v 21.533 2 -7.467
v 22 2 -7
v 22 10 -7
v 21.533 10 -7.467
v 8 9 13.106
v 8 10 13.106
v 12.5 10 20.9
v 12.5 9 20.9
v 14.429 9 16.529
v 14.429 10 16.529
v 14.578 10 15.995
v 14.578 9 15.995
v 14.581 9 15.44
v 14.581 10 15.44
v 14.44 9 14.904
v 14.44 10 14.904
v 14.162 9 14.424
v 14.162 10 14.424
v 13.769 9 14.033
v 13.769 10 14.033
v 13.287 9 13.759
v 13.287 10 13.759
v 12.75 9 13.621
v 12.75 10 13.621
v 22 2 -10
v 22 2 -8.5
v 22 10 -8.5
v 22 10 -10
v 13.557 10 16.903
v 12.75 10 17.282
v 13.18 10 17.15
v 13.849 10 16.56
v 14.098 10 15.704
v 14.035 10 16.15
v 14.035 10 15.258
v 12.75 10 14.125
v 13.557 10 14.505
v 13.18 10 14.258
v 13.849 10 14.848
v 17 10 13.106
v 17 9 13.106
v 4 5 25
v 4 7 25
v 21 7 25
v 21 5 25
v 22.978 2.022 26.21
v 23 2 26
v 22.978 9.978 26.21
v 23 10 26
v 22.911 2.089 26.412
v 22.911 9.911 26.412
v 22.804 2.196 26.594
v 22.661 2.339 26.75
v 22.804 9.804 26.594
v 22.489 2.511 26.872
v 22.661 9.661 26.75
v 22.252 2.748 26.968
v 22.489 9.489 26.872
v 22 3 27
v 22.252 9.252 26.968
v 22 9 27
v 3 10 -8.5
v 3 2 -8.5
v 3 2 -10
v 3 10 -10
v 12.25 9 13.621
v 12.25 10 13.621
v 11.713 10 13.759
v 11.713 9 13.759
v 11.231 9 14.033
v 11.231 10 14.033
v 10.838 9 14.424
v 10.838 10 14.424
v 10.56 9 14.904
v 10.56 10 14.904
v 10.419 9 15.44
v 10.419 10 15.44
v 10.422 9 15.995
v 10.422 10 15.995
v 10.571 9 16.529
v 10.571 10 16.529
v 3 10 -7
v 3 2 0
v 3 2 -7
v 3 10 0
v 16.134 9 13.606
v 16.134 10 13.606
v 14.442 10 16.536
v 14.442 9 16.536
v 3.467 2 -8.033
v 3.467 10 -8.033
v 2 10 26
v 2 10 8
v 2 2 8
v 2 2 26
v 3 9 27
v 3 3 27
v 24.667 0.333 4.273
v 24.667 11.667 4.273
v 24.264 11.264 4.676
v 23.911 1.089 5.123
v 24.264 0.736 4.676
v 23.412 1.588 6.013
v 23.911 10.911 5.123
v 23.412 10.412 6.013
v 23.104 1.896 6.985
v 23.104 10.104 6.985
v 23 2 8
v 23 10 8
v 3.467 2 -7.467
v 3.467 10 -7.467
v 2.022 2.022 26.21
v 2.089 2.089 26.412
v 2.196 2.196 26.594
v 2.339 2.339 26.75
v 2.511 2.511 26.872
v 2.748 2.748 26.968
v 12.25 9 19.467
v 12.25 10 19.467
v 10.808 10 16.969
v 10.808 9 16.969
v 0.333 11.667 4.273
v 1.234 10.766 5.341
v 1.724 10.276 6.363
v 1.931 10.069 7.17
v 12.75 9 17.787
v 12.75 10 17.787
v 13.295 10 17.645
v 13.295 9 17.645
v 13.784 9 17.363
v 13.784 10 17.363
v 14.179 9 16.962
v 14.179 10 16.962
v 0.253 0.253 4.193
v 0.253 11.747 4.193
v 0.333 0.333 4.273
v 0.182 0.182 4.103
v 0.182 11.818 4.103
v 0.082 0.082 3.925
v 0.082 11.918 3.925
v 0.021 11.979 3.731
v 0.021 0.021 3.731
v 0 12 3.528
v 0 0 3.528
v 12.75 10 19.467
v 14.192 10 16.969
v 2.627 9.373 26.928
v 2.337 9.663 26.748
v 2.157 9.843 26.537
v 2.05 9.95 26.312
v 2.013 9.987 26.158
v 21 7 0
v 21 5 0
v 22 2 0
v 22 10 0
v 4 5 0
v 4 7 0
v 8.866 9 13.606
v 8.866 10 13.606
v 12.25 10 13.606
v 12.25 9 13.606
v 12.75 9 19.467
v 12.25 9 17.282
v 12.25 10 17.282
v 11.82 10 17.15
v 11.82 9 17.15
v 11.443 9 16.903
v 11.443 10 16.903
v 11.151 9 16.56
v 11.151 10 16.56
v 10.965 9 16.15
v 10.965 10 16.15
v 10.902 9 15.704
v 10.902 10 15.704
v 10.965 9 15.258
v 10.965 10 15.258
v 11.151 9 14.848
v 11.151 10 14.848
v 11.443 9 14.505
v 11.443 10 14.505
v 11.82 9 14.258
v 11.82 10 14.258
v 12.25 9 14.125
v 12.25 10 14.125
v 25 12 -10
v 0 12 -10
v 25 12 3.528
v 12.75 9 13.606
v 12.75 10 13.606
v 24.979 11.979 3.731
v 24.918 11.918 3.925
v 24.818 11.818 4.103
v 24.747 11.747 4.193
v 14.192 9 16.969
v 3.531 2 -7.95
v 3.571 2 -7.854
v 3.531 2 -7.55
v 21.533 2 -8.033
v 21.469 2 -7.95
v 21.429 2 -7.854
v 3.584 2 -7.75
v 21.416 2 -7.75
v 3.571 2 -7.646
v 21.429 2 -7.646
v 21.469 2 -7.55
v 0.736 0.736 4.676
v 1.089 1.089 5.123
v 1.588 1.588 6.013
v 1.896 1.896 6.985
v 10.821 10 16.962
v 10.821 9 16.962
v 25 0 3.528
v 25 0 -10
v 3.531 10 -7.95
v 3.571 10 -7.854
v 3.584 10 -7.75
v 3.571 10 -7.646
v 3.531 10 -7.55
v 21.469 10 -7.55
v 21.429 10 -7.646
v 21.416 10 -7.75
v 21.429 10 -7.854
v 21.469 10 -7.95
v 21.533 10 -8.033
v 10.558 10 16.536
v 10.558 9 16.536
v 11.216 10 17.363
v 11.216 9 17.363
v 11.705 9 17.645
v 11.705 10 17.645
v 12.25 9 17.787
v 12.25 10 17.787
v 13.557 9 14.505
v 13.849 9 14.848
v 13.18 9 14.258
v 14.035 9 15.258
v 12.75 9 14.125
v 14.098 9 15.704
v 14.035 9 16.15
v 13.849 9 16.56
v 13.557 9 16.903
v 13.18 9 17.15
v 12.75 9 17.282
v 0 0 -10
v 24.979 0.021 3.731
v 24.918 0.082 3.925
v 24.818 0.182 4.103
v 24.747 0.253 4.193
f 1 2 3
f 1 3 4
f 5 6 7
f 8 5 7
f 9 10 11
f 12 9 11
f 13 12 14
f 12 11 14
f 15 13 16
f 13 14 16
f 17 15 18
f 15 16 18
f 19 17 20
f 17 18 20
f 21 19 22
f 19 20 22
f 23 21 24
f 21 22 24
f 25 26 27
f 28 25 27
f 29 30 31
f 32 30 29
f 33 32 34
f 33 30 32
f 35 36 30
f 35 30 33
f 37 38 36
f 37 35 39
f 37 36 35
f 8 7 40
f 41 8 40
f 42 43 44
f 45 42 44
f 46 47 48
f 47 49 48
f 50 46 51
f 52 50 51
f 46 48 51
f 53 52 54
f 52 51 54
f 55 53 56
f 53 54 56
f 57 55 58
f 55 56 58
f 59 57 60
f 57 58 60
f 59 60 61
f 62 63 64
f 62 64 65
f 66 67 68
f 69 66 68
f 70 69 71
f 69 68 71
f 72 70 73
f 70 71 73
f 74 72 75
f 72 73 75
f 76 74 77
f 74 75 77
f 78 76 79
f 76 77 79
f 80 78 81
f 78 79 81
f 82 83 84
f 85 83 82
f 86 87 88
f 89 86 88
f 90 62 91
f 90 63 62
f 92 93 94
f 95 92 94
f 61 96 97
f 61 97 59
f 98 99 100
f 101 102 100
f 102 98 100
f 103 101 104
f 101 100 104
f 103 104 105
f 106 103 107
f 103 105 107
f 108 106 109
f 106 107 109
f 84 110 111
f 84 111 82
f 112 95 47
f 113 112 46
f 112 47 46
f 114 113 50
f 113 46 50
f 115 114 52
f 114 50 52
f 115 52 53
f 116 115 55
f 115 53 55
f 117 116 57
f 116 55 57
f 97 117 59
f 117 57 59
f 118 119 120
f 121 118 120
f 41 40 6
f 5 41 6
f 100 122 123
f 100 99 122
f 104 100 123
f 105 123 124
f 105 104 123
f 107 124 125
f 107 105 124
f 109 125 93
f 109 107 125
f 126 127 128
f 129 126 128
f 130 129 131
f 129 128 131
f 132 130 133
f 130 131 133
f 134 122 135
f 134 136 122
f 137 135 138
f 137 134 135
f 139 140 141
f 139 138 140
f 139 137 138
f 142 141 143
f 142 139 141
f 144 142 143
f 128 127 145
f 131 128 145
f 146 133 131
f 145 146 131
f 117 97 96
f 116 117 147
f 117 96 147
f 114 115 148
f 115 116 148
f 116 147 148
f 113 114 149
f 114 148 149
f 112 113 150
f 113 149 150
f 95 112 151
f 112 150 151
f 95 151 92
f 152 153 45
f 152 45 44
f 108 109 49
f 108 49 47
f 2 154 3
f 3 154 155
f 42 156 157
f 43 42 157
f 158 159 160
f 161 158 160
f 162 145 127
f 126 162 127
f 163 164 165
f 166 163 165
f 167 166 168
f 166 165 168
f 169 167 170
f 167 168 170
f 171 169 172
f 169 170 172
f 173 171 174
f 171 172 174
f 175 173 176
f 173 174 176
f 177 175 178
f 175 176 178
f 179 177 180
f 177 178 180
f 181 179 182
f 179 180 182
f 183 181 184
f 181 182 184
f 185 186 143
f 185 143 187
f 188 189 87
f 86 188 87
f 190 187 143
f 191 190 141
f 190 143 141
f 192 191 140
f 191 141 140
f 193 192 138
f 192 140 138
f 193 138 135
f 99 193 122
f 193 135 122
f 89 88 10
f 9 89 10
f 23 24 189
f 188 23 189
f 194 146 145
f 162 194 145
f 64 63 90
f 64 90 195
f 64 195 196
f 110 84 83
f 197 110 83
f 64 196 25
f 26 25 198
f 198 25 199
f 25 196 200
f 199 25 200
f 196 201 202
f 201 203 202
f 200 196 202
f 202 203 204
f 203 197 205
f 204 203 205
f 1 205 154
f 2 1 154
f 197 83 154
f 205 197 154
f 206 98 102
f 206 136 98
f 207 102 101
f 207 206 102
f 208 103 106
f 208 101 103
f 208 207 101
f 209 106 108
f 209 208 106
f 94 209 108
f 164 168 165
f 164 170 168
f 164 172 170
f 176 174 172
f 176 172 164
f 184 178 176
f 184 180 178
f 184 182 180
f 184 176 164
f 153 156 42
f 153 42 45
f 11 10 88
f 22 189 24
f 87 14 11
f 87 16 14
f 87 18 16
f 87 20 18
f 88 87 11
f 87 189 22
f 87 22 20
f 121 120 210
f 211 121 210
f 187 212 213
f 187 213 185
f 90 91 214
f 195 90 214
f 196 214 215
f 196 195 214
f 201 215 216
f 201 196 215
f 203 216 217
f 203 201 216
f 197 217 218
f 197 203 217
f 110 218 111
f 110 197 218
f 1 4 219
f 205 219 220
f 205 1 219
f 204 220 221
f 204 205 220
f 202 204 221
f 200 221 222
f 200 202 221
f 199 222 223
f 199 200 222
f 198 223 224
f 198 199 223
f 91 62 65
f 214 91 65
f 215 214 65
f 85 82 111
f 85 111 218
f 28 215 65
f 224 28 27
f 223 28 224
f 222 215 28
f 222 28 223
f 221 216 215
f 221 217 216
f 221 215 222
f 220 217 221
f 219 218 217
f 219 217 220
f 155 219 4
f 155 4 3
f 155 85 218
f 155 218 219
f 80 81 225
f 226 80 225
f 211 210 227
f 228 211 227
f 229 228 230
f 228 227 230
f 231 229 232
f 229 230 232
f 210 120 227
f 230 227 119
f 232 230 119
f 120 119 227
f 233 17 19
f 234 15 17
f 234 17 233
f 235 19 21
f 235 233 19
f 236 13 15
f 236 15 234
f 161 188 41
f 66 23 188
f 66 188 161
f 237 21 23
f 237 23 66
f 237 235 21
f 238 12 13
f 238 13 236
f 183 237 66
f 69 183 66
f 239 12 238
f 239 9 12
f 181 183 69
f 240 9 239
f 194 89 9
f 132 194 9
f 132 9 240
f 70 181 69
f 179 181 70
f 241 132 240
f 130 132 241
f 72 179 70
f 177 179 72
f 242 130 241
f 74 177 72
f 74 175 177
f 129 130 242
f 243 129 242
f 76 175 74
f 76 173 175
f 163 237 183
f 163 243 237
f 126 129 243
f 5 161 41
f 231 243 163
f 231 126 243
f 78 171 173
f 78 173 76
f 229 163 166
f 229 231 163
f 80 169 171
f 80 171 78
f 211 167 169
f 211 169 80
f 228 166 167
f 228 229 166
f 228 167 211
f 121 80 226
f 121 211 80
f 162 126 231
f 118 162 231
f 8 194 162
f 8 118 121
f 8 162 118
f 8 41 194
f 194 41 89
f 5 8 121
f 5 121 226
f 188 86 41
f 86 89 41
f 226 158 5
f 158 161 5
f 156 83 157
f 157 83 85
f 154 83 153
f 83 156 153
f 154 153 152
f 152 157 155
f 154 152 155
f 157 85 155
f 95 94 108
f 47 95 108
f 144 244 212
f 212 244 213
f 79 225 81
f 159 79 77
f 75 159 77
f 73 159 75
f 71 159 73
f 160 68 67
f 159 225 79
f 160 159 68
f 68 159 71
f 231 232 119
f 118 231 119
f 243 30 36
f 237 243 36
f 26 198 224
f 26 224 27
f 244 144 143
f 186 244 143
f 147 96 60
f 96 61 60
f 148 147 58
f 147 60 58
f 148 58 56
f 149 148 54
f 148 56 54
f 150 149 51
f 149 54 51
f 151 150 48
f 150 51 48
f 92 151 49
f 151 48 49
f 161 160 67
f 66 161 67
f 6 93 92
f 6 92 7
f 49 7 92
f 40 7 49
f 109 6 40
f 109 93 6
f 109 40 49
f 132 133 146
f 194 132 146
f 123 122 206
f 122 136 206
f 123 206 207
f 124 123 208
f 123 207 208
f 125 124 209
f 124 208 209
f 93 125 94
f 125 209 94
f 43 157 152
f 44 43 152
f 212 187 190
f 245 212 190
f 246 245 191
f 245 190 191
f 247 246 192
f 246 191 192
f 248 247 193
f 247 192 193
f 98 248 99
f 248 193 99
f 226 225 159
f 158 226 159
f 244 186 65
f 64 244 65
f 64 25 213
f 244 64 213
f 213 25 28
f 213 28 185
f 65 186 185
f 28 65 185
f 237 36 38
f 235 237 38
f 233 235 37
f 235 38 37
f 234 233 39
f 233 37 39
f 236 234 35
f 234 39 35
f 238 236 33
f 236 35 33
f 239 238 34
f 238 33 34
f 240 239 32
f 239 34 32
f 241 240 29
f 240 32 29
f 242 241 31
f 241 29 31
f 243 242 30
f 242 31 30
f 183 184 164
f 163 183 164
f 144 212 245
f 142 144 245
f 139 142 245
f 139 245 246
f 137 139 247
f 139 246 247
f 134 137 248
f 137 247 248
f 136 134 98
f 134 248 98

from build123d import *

# Parameters (mm, degrees)
F0_W           = 25
F0_H           = 12
F0_W_2         = 19
F0_H_2         = 8
F1_DEPTH       = 10
F2_W           = 21
F2_H           = 8
F2_W_2         = 17
F2_H_2         = 2
F3_DEPTH       = 25
F4_W           = 21
F4_H           = 8
F4_W_2         = 17
F4_H_2         = 2
F5_DEPTH       = 2
F6_W           = 25
F6_H           = 12
F7_DEPTH       = 4
F10_DEPTH      = 4
F10_DEPTH_BACK = 4
F11_T1_DEPTH   = 21
F11_T3_DEPTH   = 8
F11_T9_DEPTH   = 31
F11_T14_DEPTH  = 18
F11_T22_DEPTH  = 31
F11_T27_DEPTH  = 18
F11_T35_DEPTH  = 31
F11_T40_DEPTH  = 18
F11_T48_DEPTH  = 18
F11_T53_DEPTH  = 31
F12_R          = 1
F14_DEPTH      = 1


# Not quite as in the source:
# - a fillet or chamfer that OpenCascade refuses, or shapes differently, is made with other operations: its cross-section is extruded or revolved along the edge and cut away or added


with BuildPart() as f1:
    # F0 (on Top) → F1 (new body)
    with BuildSketch(Plane.XY):
        with Locations((12.5, 6)):
            Rectangle(F0_W, F0_H)
        with Locations((12.5, 6)):
            Rectangle(F0_W_2, F0_H_2, mode=Mode.SUBTRACT)
    extrude(amount=-F1_DEPTH)

    # F2 (on Top) → F3 (join)
    with BuildSketch(Plane.XY):
        with Locations((12.5, 6)):
            Rectangle(F2_W, F2_H)
        with Locations((12.5, 6)):
            Rectangle(F2_W_2, F2_H_2, mode=Mode.SUBTRACT)
    extrude(amount=F3_DEPTH)

    # F4 (on face) → F5 (join)
    with BuildSketch(Plane.XY.offset(25)):
        with Locations((12.5, 6)):
            Rectangle(F4_W, F4_H)
        with Locations((12.5, 6)):
            Rectangle(F4_W_2, F4_H_2, mode=Mode.SUBTRACT)
        with Locations((12.5, 6)):
            Rectangle(F4_W_2, F4_H_2)
    extrude(amount=F5_DEPTH)

    # F6 (on face) → F7 (join)
    with BuildSketch(Plane.XY):
        with Locations((12.5, 6)):
            Rectangle(F6_W, F6_H)
        Polygon((23, 2), (22, 2), (3, 2), (2, 2), (2, 10), (3, 10), (22, 10), (23, 10), align=None, mode=Mode.SUBTRACT)
    extrude(amount=F7_DEPTH)

    # F9 (on offset) → F10 (join, two sides)
    with BuildSketch(Plane.XZ.offset(-6)) as f10_sk:
        with BuildLine():
            Line((3, -7), (3, -8.5))
            Line((3, -8.5), (3.4671572875, -8.0328427125))
            ThreePointArc((3.4671572875, -8.0328427125), (3.5843145751, -7.75), (3.4671572875, -7.4671572875))
            Line((3.4671572875, -7.4671572875), (3, -7))
        make_face()
        with BuildLine():
            Line((21.5328427125, -8.0328427125), (22, -8.5))
            Line((22, -8.5), (22, -7))
            Line((22, -7), (21.5328427125, -7.4671572875))
            ThreePointArc((21.5328427125, -7.4671572875), (21.4156854249, -7.75), (21.5328427125, -8.0328427125))
        make_face()
    extrude(amount=F10_DEPTH)
    extrude(f10_sk.sketch, amount=-F10_DEPTH_BACK)

    # F11: fillet of radius 5 on 4 edges, made by hand

    # F11_s2 → F11_t1 (join)
    with BuildSketch(Plane.YZ.offset(2)):
        with BuildLine():
            ThreePointArc((0, 4), (1.472135955, 5.7639320225), (2, 8))
            Line((2, 8), (2, 4))
            Line((2, 4), (0, 4))
        make_face()
        with BuildLine():
            ThreePointArc((12, 4), (10.527864045, 5.7639320225), (10, 8))
            Line((10, 8), (10, 4))
            Line((10, 4), (12, 4))
        make_face()
    extrude(amount=F11_T1_DEPTH)

    # F11_s4 → F11_t3 (join)
    with BuildSketch(Plane.XZ.offset(-10)):
        with BuildLine():
            ThreePointArc((25, 4), (23.527864045, 5.7639320225), (23, 8))
            Line((23, 8), (23, 4))
            Line((23, 4), (25, 4))
        make_face()
        with BuildLine():
            ThreePointArc((0, 4), (1.472135955, 5.7639320225), (2, 8))
            Line((2, 8), (2, 4))
            Line((2, 4), (0, 4))
        make_face()
    extrude(amount=F11_T3_DEPTH)


with BuildPart() as f11_tool7:
    # F11_s8 → F11_t9 (new body)
    with BuildSketch(Plane.YZ.offset(-8)):
        with BuildLine():
            ThreePointArc((0, 4), (1.472135955, 5.7639320225), (2, 8))
            Line((2, 8), (2, 4))
            Line((2, 4), (0, 4))
        make_face()
    extrude(amount=F11_T9_DEPTH)

    split(bisect_by=Plane.YZ, keep=Keep.TOP)

    split(bisect_by=Plane.YZ.offset(2), keep=Keep.BOTTOM)


with BuildPart() as f11_tool12:
    # F11_s13 → F11_t14 (new body)
    with BuildSketch(Plane.XZ.offset(8)):
        with BuildLine():
            ThreePointArc((0, 4), (1.472135955, 5.7639320225), (2, 8))
            Line((2, 8), (2, 4))
            Line((2, 4), (0, 4))
        make_face()
    extrude(amount=-F11_T14_DEPTH)

    split(bisect_by=Plane.XZ, keep=Keep.BOTTOM)

    split(bisect_by=Plane.XZ.offset(-2), keep=Keep.TOP)


with BuildPart() as f11_tool7_1:
    add(f11_tool7.part)

    # F11_t17: intersect F11_tool12
    add(f11_tool12.part, mode=Mode.INTERSECT)


with BuildPart() as f1_1:
    add(f1.part)

    # F11_t5: union F11_tool7
    add(f11_tool7_1.part)


with BuildPart() as f11_tool20:
    # F11_s21 → F11_t22 (new body)
    with BuildSketch(Plane.YZ.offset(2)):
        with BuildLine():
            ThreePointArc((0, 4), (1.472135955, 5.7639320225), (2, 8))
            Line((2, 8), (2, 4))
            Line((2, 4), (0, 4))
        make_face()
    extrude(amount=F11_T22_DEPTH)

    split(bisect_by=Plane.YZ.offset(25), keep=Keep.BOTTOM)

    split(bisect_by=Plane.YZ.offset(23), keep=Keep.TOP)


with BuildPart() as f11_tool25:
    # F11_s26 → F11_t27 (new body)
    with BuildSketch(Plane.XZ.offset(-10)):
        with BuildLine():
            ThreePointArc((25, 4), (23.527864045, 5.7639320225), (23, 8))
            Line((23, 8), (23, 4))
            Line((23, 4), (25, 4))
        make_face()
    extrude(amount=F11_T27_DEPTH)

    split(bisect_by=Plane.XZ, keep=Keep.BOTTOM)

    split(bisect_by=Plane.XZ.offset(-2), keep=Keep.TOP)


with BuildPart() as f11_tool20_1:
    add(f11_tool20.part)

    # F11_t30: intersect F11_tool25
    add(f11_tool25.part, mode=Mode.INTERSECT)


with BuildPart() as f1_2:
    add(f1_1.part)

    # F11_t18: union F11_tool20
    add(f11_tool20_1.part)


with BuildPart() as f11_tool33:
    # F11_s34 → F11_t35 (new body)
    with BuildSketch(Plane.YZ.offset(33)):
        with BuildLine():
            ThreePointArc((12, 4), (10.527864045, 5.7639320225), (10, 8))
            Line((10, 8), (10, 4))
            Line((10, 4), (12, 4))
        make_face()
    extrude(amount=-F11_T35_DEPTH)

    split(bisect_by=Plane.YZ.offset(25), keep=Keep.BOTTOM)

    split(bisect_by=Plane.YZ.offset(23), keep=Keep.TOP)


with BuildPart() as f11_tool38:
    # F11_s39 → F11_t40 (new body)
    with BuildSketch(Plane.XZ.offset(-20)):
        with BuildLine():
            ThreePointArc((25, 4), (23.527864045, 5.7639320225), (23, 8))
            Line((23, 8), (23, 4))
            Line((23, 4), (25, 4))
        make_face()
    extrude(amount=F11_T40_DEPTH)

    split(bisect_by=Plane.XZ.offset(-12), keep=Keep.TOP)

    split(bisect_by=Plane.XZ.offset(-10), keep=Keep.BOTTOM)


with BuildPart() as f11_tool33_1:
    add(f11_tool33.part)

    # F11_t43: intersect F11_tool38
    add(f11_tool38.part, mode=Mode.INTERSECT)


with BuildPart() as f1_3:
    add(f1_2.part)

    # F11_t31: union F11_tool33
    add(f11_tool33_1.part)


with BuildPart() as f11_tool46:
    # F11_s47 → F11_t48 (new body)
    with BuildSketch(Plane.XZ.offset(-2)):
        with BuildLine():
            ThreePointArc((0, 4), (1.472135955, 5.7639320225), (2, 8))
            Line((2, 8), (2, 4))
            Line((2, 4), (0, 4))
        make_face()
    extrude(amount=-F11_T48_DEPTH)

    split(bisect_by=Plane.XZ.offset(-12), keep=Keep.TOP)

    split(bisect_by=Plane.XZ.offset(-10), keep=Keep.BOTTOM)


with BuildPart() as f11_tool51:
    # F11_s52 → F11_t53 (new body)
    with BuildSketch(Plane.YZ.offset(23)):
        with BuildLine():
            ThreePointArc((12, 4), (10.527864045, 5.7639320225), (10, 8))
            Line((10, 8), (10, 4))
            Line((10, 4), (12, 4))
        make_face()
    extrude(amount=-F11_T53_DEPTH)

    split(bisect_by=Plane.YZ, keep=Keep.TOP)

    split(bisect_by=Plane.YZ.offset(2), keep=Keep.BOTTOM)


with BuildPart() as f11_tool46_1:
    add(f11_tool46.part)

    # F11_t56: intersect F11_tool51
    add(f11_tool51.part, mode=Mode.INTERSECT)


with BuildPart() as f1_4:
    add(f1_3.part)

    # F11_t44: union F11_tool46
    add(f11_tool46_1.part)

    # F12
    f12_edges = [f1_4.edges().sort_by_distance(p)[0] for p in [
        (23, 6, 27),
        (12.5, 2, 27),
        (2, 6, 27),
        (12.5, 10, 27),
        (12.5, 12, 4),
        (25, 6, 4),
        (12.5, 0, 4),
        (0, 6, 4),
    ]]
    fillet(f12_edges, radius=F12_R)

    # F13 (on face) → F14 (cut)
    with BuildSketch(Plane(origin=(0, 10, 0), x_dir=(-1, 0, 0), z_dir=(0, 1, 0))):
        Polygon((-12.5, 20.9), (-17, 13.1057713659), (-8, 13.1057713659), align=None)
        with BuildLine():
            Line((-12.75, 13.6057713659), (-16.1339745962, 13.6057713659))
            Line((-16.1339745962, 13.6057713659), (-14.4419872981, 16.536379332))
            Line((-14.4419872981, 16.536379332), (-14.4290420842, 16.5289054093))
            ThreePointArc((-14.4290420842, 16.5289054093), (-14.3169872981, 14.6548094716), (-12.75, 13.6207192114))
            Line((-12.75, 13.6207192114), (-12.75, 13.6057713659))
        make_face(mode=Mode.SUBTRACT)
        with BuildLine():
            ThreePointArc((-12.75, 14.125447255), (-14.0980762114, 15.7038475773), (-12.75, 17.2822478995))
            Line((-12.75, 17.2822478995), (-12.75, 14.125447255))
        make_face(mode=Mode.SUBTRACT)
        with BuildLine():
            ThreePointArc((-12.25, 17.2822478995), (-10.9019237886, 15.7038475773), (-12.25, 14.125447255))
            Line((-12.25, 14.125447255), (-12.25, 17.2822478995))
        make_face(mode=Mode.SUBTRACT)
        with BuildLine():
            Line((-8.8660254038, 13.6057713659), (-12.25, 13.6057713659))
            Line((-12.25, 13.6057713659), (-12.25, 13.6207192114))
            ThreePointArc((-12.25, 13.6207192114), (-10.6830127019, 14.6548094716), (-10.5709579158, 16.5289054093))
            Line((-10.5709579158, 16.5289054093), (-10.5580127019, 16.536379332))
            Line((-10.5580127019, 16.536379332), (-8.8660254038, 13.6057713659))
        make_face(mode=Mode.SUBTRACT)
        with BuildLine():
            Line((-12.75, 19.4669872981), (-12.75, 17.7869759432))
            ThreePointArc((-12.75, 17.7869759432), (-13.5490381057, 17.5208348754), (-14.1790420842, 16.9619181112))
            Line((-14.1790420842, 16.9619181112), (-14.1919872981, 16.9693920339))
            Line((-14.1919872981, 16.9693920339), (-12.75, 19.4669872981))
        make_face(mode=Mode.SUBTRACT)
        with BuildLine():
            Line((-12.25, 17.7869759432), (-12.25, 19.4669872981))
            Line((-12.25, 19.4669872981), (-10.8080127019, 16.9693920339))
            Line((-10.8080127019, 16.9693920339), (-10.8209579158, 16.9619181112))
            ThreePointArc((-10.8209579158, 16.9619181112), (-11.4509618943, 17.5208348754), (-12.25, 17.7869759432))
        make_face(mode=Mode.SUBTRACT)
    extrude(amount=-F14_DEPTH, mode=Mode.SUBTRACT)


solid = f1_4.part
